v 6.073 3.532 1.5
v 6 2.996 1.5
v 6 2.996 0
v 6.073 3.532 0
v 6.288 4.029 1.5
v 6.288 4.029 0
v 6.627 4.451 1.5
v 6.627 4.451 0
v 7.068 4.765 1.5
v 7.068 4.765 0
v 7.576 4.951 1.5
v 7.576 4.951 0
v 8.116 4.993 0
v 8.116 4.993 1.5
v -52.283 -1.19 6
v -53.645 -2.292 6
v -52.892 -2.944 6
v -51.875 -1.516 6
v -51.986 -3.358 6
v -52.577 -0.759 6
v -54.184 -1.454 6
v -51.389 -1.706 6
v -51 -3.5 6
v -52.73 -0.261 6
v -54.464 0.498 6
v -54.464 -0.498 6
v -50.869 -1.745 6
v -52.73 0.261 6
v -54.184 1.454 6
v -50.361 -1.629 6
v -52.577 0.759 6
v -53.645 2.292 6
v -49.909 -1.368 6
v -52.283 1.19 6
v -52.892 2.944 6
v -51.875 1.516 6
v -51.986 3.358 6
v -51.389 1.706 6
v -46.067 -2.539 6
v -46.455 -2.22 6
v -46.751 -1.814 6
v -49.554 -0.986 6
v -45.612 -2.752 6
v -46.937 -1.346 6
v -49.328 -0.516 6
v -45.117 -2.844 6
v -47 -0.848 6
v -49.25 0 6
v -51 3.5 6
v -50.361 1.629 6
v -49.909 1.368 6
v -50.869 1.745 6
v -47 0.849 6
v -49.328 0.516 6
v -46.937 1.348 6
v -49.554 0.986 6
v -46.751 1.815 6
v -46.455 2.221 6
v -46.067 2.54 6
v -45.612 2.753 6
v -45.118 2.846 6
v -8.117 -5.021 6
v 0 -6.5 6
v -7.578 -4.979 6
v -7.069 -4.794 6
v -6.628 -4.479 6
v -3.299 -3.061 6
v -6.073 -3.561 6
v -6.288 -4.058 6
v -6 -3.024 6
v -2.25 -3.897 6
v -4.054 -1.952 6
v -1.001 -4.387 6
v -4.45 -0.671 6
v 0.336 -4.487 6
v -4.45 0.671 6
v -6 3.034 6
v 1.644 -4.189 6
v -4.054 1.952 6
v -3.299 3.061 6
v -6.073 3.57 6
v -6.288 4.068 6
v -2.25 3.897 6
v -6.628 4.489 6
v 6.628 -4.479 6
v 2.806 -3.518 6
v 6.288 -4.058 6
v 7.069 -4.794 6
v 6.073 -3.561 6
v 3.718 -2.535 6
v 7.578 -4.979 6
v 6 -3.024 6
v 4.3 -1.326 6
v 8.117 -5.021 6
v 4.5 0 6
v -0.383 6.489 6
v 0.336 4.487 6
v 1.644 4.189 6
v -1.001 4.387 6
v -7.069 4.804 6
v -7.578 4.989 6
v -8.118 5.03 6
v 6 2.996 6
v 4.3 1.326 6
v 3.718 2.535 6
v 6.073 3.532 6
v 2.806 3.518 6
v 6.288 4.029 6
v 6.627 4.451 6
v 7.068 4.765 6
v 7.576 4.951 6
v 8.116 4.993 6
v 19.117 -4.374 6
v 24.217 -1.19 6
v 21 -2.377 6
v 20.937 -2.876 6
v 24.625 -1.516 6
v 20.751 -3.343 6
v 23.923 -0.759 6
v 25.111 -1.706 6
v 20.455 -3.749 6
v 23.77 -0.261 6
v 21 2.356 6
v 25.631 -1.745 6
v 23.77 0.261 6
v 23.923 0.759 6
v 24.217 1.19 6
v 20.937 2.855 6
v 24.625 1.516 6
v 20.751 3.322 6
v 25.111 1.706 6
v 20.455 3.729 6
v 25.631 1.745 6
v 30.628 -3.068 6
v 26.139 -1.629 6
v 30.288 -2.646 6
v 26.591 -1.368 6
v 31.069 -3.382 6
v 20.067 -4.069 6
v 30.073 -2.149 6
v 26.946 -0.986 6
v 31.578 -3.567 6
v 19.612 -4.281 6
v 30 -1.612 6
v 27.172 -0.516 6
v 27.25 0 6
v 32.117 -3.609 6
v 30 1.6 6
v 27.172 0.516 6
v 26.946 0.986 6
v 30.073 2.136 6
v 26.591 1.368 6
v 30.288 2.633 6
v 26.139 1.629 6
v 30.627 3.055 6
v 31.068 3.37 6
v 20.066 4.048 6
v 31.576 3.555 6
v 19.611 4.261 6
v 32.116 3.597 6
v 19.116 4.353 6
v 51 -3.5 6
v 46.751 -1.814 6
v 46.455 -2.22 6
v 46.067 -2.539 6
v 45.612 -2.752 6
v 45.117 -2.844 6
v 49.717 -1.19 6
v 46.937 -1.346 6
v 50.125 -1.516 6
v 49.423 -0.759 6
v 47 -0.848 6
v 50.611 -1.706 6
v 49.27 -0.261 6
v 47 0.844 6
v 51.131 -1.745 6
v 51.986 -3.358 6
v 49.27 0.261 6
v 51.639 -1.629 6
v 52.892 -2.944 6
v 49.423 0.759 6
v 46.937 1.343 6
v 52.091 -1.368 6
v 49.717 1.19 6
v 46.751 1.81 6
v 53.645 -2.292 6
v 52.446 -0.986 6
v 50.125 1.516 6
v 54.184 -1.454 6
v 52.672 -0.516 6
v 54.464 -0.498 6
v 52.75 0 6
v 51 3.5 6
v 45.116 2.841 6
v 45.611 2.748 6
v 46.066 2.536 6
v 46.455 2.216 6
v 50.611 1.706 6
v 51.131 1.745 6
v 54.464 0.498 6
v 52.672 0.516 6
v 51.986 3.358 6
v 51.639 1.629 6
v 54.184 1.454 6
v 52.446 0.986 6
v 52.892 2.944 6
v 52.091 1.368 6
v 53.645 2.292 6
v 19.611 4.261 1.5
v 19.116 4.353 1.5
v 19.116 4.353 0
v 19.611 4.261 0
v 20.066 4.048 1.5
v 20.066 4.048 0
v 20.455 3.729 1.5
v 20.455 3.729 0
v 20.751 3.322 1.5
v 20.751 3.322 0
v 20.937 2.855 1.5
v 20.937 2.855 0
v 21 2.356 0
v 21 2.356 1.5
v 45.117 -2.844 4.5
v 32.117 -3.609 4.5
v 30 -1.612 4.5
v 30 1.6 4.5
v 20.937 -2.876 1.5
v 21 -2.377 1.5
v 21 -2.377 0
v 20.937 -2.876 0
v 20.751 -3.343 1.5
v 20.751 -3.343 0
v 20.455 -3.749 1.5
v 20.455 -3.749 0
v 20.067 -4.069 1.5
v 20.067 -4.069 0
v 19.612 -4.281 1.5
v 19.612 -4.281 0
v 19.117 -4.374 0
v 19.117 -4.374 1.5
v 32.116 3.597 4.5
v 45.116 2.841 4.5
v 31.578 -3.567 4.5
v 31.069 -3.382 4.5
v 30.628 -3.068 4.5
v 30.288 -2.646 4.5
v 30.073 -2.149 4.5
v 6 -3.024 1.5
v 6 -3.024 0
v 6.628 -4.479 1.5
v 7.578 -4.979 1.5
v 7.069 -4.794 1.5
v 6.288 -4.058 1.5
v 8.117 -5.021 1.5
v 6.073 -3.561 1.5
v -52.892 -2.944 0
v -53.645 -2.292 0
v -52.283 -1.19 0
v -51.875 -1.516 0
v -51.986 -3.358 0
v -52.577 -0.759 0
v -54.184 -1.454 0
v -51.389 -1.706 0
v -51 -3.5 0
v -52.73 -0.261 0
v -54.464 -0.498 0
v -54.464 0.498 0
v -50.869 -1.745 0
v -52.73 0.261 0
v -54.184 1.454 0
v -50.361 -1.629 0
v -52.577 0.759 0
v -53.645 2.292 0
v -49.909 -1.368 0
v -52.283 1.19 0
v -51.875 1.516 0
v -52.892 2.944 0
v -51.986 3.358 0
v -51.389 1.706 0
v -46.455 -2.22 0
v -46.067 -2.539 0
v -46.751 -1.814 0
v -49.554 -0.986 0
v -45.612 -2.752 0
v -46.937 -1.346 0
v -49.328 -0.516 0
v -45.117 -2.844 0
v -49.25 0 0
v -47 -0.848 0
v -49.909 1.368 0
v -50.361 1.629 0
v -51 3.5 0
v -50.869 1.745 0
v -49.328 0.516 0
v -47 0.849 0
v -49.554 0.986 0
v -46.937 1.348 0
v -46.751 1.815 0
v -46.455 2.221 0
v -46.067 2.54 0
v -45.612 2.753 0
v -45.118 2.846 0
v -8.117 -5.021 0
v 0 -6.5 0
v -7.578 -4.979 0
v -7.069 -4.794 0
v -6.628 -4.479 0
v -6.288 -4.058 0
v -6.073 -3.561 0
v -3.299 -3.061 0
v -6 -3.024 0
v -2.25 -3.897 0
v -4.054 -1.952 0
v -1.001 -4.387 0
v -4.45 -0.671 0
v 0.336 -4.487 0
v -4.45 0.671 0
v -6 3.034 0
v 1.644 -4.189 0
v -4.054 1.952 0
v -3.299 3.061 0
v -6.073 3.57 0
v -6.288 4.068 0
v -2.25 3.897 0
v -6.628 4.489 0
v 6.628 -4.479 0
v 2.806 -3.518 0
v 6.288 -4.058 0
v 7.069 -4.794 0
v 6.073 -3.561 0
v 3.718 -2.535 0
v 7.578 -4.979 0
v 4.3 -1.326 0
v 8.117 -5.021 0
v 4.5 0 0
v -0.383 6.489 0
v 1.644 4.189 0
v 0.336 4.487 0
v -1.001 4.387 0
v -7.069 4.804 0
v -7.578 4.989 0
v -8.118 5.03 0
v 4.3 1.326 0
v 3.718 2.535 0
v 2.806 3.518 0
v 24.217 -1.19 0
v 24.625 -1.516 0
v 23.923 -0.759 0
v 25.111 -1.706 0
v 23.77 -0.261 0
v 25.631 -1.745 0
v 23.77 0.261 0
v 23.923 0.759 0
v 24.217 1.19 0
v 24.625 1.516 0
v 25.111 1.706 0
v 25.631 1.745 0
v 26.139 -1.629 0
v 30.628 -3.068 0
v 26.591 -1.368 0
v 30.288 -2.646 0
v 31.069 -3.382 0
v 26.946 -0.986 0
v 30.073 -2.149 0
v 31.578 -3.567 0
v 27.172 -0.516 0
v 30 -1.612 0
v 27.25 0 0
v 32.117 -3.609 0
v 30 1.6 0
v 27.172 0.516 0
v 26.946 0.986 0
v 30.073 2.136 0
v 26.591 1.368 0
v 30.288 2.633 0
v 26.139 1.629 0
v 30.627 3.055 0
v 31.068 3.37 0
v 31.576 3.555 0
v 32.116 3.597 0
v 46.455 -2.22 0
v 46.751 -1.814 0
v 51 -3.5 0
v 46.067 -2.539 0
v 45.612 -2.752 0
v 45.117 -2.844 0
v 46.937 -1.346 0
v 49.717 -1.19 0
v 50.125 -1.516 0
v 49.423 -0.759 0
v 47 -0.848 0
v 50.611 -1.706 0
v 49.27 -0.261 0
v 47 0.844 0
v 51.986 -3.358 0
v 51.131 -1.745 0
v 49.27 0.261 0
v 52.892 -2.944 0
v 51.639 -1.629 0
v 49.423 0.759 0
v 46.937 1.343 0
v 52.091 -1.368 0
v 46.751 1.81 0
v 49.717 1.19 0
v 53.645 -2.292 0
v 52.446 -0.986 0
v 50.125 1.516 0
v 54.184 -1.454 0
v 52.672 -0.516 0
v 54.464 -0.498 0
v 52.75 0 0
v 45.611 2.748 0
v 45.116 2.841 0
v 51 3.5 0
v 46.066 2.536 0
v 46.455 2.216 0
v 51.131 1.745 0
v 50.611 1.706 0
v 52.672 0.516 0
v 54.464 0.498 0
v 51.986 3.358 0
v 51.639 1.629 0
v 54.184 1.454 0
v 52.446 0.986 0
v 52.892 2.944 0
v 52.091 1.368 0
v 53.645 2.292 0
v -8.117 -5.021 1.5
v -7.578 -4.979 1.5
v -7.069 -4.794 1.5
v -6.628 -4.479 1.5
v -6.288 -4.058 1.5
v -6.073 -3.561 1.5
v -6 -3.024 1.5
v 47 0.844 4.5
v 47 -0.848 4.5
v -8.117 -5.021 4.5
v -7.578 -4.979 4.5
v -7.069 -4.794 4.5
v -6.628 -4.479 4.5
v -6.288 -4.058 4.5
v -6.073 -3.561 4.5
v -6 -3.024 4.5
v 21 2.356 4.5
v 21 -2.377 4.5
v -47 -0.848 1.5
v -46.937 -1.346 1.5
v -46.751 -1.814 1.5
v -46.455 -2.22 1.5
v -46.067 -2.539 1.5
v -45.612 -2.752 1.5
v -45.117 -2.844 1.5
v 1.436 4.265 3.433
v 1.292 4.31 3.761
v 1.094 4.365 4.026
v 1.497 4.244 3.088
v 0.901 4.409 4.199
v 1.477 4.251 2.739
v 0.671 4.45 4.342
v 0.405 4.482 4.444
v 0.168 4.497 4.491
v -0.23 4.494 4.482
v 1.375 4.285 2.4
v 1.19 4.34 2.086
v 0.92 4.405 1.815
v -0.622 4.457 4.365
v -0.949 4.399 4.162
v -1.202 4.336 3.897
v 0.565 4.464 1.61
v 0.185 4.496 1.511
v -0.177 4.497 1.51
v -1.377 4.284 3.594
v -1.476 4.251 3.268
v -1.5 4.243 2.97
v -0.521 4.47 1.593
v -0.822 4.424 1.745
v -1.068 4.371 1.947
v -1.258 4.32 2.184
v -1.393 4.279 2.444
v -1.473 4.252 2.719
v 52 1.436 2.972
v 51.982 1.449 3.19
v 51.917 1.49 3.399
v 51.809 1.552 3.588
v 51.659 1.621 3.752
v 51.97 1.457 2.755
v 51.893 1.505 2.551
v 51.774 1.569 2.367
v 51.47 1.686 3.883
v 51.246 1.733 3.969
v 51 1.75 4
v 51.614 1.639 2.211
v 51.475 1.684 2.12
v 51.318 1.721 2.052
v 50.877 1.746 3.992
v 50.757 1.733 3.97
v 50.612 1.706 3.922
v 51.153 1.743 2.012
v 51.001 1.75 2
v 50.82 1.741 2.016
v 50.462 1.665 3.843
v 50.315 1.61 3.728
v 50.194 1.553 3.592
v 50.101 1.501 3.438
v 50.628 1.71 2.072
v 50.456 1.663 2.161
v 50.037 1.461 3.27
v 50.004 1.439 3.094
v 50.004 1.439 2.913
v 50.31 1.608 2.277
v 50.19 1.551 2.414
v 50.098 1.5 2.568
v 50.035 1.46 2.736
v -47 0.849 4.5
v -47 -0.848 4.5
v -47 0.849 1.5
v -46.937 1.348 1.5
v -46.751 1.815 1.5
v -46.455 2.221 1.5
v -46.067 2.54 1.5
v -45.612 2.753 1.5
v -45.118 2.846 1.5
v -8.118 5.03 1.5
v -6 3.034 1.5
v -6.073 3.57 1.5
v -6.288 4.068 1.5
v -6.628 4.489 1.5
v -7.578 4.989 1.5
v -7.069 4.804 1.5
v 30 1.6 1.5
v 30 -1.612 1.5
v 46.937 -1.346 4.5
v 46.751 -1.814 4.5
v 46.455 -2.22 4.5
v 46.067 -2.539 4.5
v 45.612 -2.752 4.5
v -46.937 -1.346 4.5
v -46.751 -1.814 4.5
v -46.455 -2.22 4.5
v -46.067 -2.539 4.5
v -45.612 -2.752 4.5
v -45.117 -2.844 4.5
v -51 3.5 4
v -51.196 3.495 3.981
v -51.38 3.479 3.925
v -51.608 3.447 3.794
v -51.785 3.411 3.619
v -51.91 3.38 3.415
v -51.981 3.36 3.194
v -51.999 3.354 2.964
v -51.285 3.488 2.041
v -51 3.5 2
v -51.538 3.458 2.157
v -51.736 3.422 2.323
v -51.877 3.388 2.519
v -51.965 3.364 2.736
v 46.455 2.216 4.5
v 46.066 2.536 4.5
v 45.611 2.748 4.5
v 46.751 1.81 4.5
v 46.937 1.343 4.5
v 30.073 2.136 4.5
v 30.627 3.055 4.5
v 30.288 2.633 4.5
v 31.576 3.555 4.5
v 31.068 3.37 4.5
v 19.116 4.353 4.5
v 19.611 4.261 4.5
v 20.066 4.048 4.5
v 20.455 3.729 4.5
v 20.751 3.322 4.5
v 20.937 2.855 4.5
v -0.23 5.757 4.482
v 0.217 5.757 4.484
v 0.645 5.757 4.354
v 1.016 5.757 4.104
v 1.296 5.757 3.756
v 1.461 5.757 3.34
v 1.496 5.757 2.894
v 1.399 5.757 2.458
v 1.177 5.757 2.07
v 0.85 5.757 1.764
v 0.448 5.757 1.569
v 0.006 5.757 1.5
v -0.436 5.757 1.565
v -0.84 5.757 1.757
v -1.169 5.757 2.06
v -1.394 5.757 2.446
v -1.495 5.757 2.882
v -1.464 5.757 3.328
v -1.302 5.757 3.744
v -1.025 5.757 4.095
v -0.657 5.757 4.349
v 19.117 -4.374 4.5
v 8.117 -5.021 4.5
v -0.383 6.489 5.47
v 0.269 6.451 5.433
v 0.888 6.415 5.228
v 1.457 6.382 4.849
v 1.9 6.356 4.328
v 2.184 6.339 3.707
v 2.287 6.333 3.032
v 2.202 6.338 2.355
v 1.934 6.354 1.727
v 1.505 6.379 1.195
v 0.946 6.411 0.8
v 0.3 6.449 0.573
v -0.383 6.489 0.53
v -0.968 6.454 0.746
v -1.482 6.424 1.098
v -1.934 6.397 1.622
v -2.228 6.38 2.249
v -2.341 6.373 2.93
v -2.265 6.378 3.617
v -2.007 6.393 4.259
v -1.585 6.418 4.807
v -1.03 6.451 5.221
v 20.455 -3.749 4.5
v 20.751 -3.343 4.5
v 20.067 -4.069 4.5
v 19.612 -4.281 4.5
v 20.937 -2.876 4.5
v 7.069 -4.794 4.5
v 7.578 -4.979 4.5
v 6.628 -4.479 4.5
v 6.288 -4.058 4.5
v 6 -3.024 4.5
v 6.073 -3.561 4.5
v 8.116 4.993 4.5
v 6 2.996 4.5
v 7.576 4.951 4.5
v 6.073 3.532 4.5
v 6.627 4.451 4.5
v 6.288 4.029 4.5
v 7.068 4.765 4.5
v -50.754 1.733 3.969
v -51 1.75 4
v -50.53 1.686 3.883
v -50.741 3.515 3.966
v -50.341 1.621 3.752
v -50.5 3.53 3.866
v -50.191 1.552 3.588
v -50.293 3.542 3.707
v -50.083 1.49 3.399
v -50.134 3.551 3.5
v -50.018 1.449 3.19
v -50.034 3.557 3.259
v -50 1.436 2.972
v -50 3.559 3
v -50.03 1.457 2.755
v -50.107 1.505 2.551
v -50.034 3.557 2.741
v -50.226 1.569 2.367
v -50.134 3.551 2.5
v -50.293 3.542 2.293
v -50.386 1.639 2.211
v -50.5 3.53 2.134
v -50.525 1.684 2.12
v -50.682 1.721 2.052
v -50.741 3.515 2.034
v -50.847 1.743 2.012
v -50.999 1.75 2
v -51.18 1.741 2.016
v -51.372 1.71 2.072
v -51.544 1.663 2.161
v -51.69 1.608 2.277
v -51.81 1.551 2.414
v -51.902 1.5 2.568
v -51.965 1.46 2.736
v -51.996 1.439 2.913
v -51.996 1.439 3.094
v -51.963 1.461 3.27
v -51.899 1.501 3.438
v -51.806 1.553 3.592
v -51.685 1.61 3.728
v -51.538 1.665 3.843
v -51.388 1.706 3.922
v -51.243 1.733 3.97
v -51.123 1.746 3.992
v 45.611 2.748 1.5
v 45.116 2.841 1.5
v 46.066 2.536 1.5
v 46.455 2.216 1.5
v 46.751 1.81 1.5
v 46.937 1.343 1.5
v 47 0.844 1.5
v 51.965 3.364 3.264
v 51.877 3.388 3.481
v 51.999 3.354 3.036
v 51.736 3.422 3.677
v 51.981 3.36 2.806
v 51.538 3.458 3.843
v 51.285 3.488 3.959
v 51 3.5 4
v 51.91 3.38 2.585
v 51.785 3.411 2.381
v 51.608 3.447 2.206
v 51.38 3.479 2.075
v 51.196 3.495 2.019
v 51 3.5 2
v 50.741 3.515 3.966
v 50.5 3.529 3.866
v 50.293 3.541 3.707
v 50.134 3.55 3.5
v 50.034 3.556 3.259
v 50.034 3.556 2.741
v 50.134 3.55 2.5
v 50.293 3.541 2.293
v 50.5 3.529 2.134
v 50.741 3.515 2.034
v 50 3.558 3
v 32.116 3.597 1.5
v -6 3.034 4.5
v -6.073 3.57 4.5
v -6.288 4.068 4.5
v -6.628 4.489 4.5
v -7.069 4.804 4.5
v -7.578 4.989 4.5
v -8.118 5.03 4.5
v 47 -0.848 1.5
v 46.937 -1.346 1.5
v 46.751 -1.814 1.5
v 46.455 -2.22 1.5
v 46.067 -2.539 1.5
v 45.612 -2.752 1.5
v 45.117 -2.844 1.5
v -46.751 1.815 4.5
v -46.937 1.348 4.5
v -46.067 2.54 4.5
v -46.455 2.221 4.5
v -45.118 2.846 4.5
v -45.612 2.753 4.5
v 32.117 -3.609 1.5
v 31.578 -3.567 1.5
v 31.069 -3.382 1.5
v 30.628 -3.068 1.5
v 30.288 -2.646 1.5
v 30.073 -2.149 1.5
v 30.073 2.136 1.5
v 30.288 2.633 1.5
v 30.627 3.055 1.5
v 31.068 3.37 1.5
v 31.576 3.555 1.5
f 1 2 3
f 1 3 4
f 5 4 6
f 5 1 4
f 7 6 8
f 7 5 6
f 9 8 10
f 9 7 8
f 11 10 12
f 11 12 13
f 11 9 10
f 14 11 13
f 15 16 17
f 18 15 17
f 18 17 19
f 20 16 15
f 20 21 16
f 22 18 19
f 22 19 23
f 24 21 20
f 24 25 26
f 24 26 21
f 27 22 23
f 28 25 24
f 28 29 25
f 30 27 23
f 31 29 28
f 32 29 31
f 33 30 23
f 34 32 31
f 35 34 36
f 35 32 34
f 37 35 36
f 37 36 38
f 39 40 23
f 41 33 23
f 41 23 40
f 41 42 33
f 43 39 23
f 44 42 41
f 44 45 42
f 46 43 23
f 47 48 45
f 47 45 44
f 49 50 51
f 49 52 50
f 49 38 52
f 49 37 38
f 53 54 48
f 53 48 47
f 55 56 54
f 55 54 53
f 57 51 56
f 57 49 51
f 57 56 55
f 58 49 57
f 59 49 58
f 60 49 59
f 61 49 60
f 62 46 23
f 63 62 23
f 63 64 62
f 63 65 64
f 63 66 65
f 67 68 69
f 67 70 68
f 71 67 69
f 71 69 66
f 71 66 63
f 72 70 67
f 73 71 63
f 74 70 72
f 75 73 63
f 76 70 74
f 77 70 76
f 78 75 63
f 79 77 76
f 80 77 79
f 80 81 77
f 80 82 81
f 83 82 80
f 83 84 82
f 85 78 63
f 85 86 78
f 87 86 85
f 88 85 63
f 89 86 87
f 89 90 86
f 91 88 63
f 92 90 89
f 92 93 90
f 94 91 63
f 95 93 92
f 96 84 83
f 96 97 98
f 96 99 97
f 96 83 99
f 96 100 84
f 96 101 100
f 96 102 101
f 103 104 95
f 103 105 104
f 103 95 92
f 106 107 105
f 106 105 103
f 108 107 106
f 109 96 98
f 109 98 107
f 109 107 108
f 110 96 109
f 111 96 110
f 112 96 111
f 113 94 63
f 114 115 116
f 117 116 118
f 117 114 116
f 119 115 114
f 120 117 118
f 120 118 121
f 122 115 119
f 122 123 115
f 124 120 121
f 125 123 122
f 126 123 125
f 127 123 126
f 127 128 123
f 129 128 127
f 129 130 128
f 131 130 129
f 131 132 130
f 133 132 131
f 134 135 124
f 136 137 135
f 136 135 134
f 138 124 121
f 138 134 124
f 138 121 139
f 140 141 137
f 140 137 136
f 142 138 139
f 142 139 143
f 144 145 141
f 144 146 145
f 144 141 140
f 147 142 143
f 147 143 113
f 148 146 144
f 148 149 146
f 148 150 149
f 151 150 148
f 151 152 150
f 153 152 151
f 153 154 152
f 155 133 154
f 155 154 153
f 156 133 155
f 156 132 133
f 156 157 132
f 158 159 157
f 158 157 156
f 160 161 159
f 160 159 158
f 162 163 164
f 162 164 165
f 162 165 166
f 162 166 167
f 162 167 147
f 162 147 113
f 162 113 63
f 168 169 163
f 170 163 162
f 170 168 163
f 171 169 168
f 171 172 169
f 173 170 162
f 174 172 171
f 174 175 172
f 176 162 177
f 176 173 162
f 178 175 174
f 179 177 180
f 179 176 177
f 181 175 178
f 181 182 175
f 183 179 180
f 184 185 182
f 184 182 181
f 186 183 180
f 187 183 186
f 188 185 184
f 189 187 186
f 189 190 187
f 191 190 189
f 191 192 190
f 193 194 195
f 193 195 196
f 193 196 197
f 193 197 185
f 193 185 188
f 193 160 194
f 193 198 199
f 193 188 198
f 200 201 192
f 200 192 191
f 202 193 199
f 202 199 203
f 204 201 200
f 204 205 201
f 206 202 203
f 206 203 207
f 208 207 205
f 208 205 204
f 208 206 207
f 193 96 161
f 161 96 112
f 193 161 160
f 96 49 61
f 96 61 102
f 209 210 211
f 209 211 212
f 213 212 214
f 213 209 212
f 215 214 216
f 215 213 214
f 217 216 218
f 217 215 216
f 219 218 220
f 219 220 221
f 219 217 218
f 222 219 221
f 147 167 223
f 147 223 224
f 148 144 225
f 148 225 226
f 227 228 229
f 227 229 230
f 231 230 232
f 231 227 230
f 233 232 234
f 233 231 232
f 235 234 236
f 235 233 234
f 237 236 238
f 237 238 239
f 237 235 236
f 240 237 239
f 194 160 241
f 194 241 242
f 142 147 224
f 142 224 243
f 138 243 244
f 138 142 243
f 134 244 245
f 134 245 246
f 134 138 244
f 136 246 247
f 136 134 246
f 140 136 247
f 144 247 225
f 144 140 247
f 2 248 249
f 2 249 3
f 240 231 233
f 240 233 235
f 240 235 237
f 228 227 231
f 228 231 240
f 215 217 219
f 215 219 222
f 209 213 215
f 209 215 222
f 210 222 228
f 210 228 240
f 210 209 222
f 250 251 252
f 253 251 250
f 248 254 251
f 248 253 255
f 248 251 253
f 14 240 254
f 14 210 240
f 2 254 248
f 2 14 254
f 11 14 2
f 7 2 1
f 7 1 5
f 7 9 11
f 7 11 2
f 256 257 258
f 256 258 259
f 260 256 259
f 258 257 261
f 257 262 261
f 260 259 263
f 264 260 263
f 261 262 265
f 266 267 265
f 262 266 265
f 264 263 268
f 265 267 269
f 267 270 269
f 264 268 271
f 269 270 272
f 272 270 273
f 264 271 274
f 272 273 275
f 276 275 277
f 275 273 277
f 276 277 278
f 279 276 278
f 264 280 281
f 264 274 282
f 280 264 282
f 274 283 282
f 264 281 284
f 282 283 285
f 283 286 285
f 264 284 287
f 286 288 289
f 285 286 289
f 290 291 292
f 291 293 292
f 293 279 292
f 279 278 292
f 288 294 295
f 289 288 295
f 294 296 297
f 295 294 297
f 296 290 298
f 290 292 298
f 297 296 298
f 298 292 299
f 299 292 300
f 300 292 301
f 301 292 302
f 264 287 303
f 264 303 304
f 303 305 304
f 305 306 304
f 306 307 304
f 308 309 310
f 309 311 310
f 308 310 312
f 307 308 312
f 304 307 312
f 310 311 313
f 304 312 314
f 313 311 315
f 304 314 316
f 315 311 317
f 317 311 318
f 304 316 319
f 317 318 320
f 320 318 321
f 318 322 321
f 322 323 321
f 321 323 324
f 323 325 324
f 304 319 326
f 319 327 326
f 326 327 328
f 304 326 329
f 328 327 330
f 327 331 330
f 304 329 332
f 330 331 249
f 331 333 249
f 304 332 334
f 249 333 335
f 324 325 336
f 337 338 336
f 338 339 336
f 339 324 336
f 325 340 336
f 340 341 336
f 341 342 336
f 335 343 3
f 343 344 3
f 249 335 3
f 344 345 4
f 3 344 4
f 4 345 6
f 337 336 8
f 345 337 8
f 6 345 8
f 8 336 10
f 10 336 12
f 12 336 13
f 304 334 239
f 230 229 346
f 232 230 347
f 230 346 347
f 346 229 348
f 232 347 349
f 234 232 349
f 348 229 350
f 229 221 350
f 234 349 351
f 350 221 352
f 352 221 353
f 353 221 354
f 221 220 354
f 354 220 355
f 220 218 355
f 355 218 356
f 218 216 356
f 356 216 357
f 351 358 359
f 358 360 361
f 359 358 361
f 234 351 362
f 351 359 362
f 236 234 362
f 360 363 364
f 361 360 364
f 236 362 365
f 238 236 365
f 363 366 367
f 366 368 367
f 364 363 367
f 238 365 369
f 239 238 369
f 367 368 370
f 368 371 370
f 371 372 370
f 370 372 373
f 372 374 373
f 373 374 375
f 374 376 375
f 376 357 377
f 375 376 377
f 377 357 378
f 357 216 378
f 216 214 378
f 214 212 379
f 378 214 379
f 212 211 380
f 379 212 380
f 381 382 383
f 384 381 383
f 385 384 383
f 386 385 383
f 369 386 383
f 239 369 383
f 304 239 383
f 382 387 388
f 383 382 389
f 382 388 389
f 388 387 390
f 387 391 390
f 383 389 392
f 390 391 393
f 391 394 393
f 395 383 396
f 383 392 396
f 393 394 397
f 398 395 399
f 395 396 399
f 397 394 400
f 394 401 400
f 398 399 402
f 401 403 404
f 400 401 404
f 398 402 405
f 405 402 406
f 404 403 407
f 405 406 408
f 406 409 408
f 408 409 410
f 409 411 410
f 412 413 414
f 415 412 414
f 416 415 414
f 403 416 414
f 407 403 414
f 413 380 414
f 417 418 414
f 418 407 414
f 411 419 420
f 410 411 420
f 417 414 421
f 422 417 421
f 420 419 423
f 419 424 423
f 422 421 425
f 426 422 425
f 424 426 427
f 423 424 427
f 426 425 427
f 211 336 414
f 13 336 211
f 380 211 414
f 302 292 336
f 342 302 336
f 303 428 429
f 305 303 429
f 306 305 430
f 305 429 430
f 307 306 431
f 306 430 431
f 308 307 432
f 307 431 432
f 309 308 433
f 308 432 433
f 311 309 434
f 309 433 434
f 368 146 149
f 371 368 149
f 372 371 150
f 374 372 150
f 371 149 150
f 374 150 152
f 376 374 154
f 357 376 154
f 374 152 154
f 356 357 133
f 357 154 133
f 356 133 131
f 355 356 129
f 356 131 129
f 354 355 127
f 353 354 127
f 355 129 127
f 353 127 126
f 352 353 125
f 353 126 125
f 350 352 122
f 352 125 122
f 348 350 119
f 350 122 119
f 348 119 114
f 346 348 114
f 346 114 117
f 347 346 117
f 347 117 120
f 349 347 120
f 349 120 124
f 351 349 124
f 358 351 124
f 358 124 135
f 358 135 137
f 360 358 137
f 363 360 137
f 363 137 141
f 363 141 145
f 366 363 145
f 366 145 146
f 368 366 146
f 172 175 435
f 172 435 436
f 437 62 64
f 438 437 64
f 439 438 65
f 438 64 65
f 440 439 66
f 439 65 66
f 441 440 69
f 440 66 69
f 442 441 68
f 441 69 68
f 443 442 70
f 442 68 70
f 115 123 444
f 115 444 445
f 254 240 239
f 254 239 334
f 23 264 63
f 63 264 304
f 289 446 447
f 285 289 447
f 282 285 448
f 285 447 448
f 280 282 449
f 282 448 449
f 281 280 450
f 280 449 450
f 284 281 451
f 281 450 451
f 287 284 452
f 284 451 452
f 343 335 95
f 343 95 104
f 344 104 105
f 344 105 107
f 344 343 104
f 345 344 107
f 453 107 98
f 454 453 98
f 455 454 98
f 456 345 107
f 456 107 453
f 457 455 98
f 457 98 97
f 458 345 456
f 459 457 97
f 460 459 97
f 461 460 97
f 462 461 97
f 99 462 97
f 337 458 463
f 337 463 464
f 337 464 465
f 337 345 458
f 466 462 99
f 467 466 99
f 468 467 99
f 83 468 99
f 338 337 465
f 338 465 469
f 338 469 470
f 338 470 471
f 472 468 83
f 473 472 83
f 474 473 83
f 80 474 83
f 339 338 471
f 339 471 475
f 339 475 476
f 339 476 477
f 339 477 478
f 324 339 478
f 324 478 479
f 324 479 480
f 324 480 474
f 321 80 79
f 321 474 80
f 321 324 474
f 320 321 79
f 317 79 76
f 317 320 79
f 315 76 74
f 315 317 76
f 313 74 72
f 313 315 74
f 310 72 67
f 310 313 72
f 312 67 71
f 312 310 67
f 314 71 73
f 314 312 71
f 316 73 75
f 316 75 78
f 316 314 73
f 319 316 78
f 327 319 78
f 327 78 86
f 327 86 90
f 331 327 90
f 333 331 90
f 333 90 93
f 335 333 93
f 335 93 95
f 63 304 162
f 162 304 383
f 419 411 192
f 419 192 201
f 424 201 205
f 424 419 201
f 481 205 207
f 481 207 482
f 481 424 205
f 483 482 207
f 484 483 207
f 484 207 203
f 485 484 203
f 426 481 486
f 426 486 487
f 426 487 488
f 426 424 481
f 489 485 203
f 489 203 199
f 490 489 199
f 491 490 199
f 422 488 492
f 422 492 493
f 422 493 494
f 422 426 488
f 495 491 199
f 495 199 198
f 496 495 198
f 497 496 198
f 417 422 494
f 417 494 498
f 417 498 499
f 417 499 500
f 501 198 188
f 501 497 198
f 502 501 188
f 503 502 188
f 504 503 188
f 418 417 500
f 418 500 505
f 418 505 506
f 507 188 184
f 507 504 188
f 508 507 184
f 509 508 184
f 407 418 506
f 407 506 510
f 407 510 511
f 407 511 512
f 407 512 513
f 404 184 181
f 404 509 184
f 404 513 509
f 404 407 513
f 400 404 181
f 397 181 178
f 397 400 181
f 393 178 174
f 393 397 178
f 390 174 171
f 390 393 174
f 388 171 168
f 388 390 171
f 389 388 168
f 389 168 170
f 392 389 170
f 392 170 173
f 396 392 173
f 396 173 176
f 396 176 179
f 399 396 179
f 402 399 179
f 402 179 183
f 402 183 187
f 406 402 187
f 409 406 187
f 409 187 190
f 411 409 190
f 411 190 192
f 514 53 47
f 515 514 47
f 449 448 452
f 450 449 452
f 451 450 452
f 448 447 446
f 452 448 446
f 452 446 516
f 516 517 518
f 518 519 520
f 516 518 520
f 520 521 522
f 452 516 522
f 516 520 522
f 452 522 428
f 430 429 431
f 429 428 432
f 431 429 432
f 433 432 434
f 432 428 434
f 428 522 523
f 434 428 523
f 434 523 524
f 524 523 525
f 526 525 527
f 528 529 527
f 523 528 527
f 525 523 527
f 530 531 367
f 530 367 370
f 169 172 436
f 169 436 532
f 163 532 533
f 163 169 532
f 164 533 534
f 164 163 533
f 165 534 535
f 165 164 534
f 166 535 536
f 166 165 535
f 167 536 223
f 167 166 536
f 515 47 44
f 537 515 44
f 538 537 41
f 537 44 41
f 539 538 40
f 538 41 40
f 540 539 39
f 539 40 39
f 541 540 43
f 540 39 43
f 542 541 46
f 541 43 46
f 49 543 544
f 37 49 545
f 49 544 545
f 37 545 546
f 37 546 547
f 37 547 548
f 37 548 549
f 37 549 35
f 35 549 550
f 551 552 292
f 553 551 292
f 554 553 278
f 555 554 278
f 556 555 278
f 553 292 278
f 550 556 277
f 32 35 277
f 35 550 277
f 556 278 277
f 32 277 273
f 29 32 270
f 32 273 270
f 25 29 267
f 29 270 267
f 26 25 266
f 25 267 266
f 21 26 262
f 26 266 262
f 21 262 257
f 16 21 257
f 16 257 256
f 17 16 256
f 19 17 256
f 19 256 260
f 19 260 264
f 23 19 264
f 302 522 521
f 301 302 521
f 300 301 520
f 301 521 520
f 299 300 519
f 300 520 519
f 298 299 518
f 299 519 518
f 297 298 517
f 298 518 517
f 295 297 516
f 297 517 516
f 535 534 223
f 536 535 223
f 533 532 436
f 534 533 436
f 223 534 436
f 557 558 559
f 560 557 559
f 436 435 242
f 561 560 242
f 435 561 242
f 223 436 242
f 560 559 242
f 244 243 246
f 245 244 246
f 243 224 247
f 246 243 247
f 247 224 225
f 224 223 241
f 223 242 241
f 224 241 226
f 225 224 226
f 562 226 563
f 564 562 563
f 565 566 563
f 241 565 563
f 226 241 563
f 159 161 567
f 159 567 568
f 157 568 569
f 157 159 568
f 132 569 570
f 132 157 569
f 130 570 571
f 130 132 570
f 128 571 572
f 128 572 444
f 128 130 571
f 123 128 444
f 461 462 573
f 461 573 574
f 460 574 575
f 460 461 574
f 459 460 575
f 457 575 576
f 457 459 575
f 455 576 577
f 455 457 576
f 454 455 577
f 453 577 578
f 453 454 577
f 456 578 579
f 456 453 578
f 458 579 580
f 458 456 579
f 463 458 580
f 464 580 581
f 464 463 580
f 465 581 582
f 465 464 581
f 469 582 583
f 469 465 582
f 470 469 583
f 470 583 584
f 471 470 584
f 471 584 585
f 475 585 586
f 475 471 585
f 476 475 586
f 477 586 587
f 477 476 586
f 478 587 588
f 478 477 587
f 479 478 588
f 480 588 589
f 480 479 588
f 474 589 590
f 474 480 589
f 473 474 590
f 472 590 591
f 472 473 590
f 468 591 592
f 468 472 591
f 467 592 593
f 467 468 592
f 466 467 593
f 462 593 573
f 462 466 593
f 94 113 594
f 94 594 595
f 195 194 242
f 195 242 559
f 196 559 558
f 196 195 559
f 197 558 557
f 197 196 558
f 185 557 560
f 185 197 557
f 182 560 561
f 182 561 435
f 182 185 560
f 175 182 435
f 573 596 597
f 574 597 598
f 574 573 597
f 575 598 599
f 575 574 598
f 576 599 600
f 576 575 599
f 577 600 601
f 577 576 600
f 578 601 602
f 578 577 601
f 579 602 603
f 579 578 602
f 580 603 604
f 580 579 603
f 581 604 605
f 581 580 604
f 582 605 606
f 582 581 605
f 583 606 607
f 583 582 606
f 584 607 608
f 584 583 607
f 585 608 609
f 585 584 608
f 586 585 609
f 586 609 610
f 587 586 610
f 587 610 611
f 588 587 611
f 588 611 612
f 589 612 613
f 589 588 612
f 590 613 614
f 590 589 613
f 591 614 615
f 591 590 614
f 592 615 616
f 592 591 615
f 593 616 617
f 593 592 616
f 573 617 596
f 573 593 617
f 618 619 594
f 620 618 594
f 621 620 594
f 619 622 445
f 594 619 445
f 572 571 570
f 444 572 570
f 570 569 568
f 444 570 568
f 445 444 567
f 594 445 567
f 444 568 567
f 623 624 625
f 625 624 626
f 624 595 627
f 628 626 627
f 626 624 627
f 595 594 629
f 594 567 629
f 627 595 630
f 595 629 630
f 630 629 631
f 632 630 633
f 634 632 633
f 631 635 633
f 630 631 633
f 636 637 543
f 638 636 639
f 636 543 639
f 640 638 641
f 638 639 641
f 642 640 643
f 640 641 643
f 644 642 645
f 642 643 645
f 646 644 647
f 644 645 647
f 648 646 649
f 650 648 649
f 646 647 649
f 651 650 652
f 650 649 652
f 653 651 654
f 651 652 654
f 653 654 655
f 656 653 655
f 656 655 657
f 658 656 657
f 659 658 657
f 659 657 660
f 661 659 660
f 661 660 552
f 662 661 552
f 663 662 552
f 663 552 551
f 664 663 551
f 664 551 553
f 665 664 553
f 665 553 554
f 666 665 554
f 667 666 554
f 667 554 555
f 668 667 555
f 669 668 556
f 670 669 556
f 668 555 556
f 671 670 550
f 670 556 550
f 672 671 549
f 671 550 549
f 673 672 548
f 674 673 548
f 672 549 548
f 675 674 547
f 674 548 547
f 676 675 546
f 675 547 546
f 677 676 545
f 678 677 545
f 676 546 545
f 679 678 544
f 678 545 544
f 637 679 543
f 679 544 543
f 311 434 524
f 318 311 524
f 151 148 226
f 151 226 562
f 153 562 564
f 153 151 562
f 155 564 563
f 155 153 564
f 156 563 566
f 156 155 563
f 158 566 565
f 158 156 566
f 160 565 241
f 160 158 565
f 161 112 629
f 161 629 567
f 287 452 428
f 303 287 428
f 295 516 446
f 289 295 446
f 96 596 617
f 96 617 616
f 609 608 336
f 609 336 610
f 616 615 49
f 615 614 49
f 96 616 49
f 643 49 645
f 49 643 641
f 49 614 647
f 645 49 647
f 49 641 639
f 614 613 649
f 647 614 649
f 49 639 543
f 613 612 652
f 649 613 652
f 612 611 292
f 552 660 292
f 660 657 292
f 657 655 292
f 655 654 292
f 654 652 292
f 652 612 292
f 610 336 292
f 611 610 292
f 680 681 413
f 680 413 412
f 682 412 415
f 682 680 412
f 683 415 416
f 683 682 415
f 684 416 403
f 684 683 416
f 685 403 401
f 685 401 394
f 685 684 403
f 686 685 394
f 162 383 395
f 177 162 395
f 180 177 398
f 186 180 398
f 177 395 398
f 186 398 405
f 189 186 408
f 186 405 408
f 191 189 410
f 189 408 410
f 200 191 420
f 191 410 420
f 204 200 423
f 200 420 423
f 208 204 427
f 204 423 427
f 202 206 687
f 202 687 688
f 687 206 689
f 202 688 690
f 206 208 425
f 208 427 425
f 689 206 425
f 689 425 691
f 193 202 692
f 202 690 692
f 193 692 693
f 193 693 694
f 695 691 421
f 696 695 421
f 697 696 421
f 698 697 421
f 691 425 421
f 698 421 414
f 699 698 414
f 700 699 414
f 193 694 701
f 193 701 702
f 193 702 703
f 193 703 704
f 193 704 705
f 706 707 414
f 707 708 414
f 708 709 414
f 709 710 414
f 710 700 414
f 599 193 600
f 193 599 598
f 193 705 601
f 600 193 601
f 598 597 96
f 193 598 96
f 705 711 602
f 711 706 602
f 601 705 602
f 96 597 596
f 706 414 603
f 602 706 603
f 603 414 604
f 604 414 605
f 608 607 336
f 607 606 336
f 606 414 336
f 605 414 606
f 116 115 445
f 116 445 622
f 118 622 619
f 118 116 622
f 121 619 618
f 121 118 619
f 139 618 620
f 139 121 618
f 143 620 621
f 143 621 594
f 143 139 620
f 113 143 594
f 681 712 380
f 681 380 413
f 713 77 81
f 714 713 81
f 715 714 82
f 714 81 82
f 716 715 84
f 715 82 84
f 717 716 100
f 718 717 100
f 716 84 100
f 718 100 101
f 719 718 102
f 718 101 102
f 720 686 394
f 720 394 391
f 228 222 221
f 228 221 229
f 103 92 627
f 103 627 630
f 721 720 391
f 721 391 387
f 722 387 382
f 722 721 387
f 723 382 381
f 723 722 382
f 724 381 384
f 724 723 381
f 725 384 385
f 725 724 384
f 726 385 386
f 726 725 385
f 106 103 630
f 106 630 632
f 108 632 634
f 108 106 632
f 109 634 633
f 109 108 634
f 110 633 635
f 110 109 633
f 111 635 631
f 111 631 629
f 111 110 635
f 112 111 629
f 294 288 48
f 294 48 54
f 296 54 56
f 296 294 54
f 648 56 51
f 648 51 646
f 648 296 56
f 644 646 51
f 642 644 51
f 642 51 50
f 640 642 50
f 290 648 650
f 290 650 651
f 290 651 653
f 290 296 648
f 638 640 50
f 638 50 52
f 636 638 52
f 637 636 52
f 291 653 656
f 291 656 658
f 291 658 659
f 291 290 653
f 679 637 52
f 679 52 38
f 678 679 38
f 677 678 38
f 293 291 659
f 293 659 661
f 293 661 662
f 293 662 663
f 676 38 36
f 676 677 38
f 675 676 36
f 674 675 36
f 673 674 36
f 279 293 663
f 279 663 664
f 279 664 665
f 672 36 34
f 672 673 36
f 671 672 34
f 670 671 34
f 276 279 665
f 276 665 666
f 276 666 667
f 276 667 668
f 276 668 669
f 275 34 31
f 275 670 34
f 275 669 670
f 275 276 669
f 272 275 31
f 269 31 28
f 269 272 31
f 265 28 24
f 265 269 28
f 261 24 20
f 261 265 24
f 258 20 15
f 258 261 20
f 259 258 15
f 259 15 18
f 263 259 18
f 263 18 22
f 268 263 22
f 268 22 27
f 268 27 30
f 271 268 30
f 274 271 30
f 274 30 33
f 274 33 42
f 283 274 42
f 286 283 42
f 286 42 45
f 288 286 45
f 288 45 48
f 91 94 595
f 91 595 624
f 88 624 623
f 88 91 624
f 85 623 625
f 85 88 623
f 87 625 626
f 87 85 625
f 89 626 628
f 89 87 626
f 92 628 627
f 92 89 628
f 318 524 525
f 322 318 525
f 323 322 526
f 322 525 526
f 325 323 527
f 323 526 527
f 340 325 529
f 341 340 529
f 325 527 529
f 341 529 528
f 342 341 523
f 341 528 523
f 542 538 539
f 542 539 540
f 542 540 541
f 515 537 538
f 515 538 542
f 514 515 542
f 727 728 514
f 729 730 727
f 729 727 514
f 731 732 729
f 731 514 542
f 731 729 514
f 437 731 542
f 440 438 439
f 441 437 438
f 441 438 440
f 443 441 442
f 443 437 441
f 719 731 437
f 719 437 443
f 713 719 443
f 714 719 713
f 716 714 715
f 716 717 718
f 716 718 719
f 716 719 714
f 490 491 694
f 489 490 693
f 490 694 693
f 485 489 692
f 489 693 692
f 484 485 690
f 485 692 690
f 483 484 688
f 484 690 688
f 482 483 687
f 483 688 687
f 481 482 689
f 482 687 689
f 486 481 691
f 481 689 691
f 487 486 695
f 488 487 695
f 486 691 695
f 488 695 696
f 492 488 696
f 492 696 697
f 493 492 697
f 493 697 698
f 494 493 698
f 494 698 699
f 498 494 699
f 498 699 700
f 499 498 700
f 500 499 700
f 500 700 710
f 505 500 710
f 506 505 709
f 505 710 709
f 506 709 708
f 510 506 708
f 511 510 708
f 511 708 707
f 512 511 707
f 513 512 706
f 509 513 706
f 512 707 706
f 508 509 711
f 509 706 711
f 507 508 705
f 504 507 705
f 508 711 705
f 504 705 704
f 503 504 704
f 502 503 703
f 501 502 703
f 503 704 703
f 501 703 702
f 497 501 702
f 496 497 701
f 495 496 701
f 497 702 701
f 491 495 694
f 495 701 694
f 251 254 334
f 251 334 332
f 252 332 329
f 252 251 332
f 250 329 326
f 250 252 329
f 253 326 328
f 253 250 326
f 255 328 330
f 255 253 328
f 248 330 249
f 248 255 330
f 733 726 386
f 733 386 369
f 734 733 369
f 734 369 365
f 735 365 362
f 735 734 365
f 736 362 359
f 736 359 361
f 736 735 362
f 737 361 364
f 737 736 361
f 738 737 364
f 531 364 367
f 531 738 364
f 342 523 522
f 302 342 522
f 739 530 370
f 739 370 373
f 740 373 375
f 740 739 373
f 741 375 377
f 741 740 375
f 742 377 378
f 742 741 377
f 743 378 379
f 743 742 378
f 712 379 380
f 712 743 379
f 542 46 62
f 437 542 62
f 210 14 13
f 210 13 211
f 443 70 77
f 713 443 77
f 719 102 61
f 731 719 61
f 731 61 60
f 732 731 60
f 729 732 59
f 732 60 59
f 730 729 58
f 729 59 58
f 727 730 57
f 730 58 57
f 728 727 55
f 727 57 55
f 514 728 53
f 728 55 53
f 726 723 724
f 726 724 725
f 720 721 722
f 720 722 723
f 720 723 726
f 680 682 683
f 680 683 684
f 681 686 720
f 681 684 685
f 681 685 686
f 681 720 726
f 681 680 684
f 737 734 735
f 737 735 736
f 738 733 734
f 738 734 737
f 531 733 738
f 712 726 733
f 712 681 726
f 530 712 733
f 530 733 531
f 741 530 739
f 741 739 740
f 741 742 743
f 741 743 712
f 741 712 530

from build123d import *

# Parameters (mm, degrees)
SKETCH1_R           = 4.5
SKETCH1_R_2         = 1.75
BOSS_EXTRUDE1_DEPTH = 6
CUT_EXTRUDE1_DEPTH  = 1.5
LPATTERN1_COUNT     = 2
LPATTERN1_PITCH     = 4.5
CUT_EXTRUDE2_DEPTH  = 1.5
LPATTERN2_COUNT     = 2
LPATTERN2_PITCH     = 4.5
CUT_EXTRUDE3_DEPTH  = 1.5
LPATTERN3_COUNT     = 2
LPATTERN3_PITCH     = 4.5
SKETCH5_R           = 1.75
CUT_EXTRUDE4_DEPTH  = 11.5
SKETCH8_R           = 1
CUT_EXTRUDE5_DEPTH  = 7


with BuildPart() as part:
    # Sketch1 → Boss-Extrude1 (new body)
    with BuildSketch(Plane.XY):
        with BuildLine():
            Line((0, -6.5), (51, -3.5))
            ThreePointArc((51, -3.5), (54.5, 0), (51, 3.5))
            Line((51, 3.5), (-0.383128511, 6.488698833))
            Line((-0.383128511, 6.488698833), (-51, 3.5))
            ThreePointArc((-51, 3.5), (-54.5, 0), (-51, -3.5))
            Line((-51, -3.5), (0, -6.5))
        make_face()
        Circle(SKETCH1_R, mode=Mode.SUBTRACT)
        with Locations((-51, 0)):
            Circle(SKETCH1_R_2, mode=Mode.SUBTRACT)
        with Locations((51, 0)):
            Circle(SKETCH1_R_2, mode=Mode.SUBTRACT)
    extrude(amount=BOSS_EXTRUDE1_DEPTH)

    # Sketch2 → Cut-Extrude1 (cut)
    with BuildSketch(Plane.XY.offset(6)):
        with BuildLine():
            Line((-8.117885696, 5.030254505), (-45.117885696, 2.845570751))
            ThreePointArc((-45.117885696, 2.845570751), (-46.455295742, 2.220949744), (-47, 0.849048033))
            Line((-47, 0.849048033), (-47, -0.847755347))
            ThreePointArc((-47, -0.847755347), (-46.455143994, -2.219818012), (-45.117444044, -2.844304094))
            Line((-45.117444044, -2.844304094), (-8.117444044, -5.020774682))
            ThreePointArc((-8.117444044, -5.020774682), (-6.627937335, -4.47936993), (-6, -3.024225935))
            Line((-6, -3.024225935), (-6, 3.033731787))
            ThreePointArc((-6, 3.033731787), (-6.628098289, 4.489027529), (-8.117885696, 5.030254505))
        make_face()
    cut_extrude1 = extrude(amount=-CUT_EXTRUDE1_DEPTH, mode=Mode.SUBTRACT)

    # LPattern1: Cut-Extrude1 ×2
    with Locations(*[(0, 0, -i * LPATTERN1_PITCH) for i in range(1, LPATTERN1_COUNT)]):
        add(cut_extrude1, mode=Mode.SUBTRACT)

    # Sketch3 → Cut-Extrude2 (cut)
    with BuildSketch(Plane.XY.offset(6)):
        with BuildLine():
            Line((8.116133684, 4.992649231), (19.116133684, 4.352834411))
            ThreePointArc((19.116133684, 4.352834411), (20.454693673, 3.728749112), (21, 2.356209016))
            Line((21, 2.356209016), (21, -2.377167112))
            ThreePointArc((21, -2.377167112), (20.455143994, -3.749229777), (19.117444044, -4.373715858))
            Line((19.117444044, -4.373715858), (8.117444044, -5.020774682))
            ThreePointArc((8.117444044, -5.020774682), (6.627937335, -4.47936993), (6, -3.024225935))
            Line((6, -3.024225935), (6, 2.996023836))
            ThreePointArc((6, 2.996023836), (6.627459904, 4.45071751), (8.116133684, 4.992649231))
        make_face()
    cut_extrude2 = extrude(amount=-CUT_EXTRUDE2_DEPTH, mode=Mode.SUBTRACT)

    # LPattern2: Cut-Extrude2 ×2
    with Locations(*[(0, 0, -i * LPATTERN2_PITCH) for i in range(1, LPATTERN2_COUNT)]):
        add(cut_extrude2, mode=Mode.SUBTRACT)

    # Sketch4 → Cut-Extrude3 (cut)
    with BuildSketch(Plane.XY.offset(6)):
        with BuildLine():
            Line((47, 0.843919439), (47, -0.847755347))
            ThreePointArc((47, -0.847755347), (46.455143994, -2.219818012), (45.117444044, -2.844304094))
            Line((45.117444044, -2.844304094), (32.117444044, -3.609009976))
            ThreePointArc((32.117444044, -3.609009976), (30.627937335, -3.067605224), (30, -1.61246123))
            Line((30, -1.61246123), (30, 1.600064227))
            ThreePointArc((30, 1.600064227), (30.627459904, 3.054757901), (32.116133684, 3.596689622))
            Line((32.116133684, 3.596689622), (45.116133684, 2.840544834))
            ThreePointArc((45.116133684, 2.840544834), (46.454693673, 2.216459536), (47, 0.843919439))
        make_face()
    cut_extrude3 = extrude(amount=-CUT_EXTRUDE3_DEPTH, mode=Mode.SUBTRACT)

    # LPattern3: Cut-Extrude3 ×2
    with Locations(*[(0, 0, -i * LPATTERN3_PITCH) for i in range(1, LPATTERN3_COUNT)]):
        add(cut_extrude3, mode=Mode.SUBTRACT)

    # Sketch5 → Cut-Extrude4 (cut)
    with BuildSketch(Plane.XY.offset(6)):
        with Locations((25.5, 0)):
            Circle(SKETCH5_R)
    extrude(amount=-CUT_EXTRUDE4_DEPTH, mode=Mode.SUBTRACT)

    # Sketch7 → Cut-Revolve1 (revolve, cut)
    with BuildSketch(Plane(origin=(0, 0, 0), x_dir=(0, 0, -1), z_dir=(1, 0, 0)), mode=Mode.PRIVATE) as cut_revolve1_sk:
        Polygon((-3, 6.488698833), (-5.5, 6.488698833), (-4.5, 5.75735408), (-4.5, 2.301697652), (-3, 2.301697652), (-3, 5.75735408), align=None)
    revolve(cut_revolve1_sk.sketch.rotate(Axis((0, 2.301697652, 3), (0, 1, 0)), 351.184602487), axis=Axis((0, 2.301697652, 3), (0, 1, 0)), mode=Mode.SUBTRACT)

    # Sketch8 → Cut-Extrude5 (cut)
    with BuildSketch(Plane(origin=(0, 6.488698833, 0), x_dir=(1, 0, 0), z_dir=(0, 1, 0))):
        with Locations(Location((-51, -3, 0), (0, 0, 270))):
            Circle(SKETCH8_R)
        with Locations(Location((51, -3, 0), (0, 0, 270))):
            Circle(SKETCH8_R)
    extrude(amount=-CUT_EXTRUDE5_DEPTH, mode=Mode.SUBTRACT)


solid = part.part
